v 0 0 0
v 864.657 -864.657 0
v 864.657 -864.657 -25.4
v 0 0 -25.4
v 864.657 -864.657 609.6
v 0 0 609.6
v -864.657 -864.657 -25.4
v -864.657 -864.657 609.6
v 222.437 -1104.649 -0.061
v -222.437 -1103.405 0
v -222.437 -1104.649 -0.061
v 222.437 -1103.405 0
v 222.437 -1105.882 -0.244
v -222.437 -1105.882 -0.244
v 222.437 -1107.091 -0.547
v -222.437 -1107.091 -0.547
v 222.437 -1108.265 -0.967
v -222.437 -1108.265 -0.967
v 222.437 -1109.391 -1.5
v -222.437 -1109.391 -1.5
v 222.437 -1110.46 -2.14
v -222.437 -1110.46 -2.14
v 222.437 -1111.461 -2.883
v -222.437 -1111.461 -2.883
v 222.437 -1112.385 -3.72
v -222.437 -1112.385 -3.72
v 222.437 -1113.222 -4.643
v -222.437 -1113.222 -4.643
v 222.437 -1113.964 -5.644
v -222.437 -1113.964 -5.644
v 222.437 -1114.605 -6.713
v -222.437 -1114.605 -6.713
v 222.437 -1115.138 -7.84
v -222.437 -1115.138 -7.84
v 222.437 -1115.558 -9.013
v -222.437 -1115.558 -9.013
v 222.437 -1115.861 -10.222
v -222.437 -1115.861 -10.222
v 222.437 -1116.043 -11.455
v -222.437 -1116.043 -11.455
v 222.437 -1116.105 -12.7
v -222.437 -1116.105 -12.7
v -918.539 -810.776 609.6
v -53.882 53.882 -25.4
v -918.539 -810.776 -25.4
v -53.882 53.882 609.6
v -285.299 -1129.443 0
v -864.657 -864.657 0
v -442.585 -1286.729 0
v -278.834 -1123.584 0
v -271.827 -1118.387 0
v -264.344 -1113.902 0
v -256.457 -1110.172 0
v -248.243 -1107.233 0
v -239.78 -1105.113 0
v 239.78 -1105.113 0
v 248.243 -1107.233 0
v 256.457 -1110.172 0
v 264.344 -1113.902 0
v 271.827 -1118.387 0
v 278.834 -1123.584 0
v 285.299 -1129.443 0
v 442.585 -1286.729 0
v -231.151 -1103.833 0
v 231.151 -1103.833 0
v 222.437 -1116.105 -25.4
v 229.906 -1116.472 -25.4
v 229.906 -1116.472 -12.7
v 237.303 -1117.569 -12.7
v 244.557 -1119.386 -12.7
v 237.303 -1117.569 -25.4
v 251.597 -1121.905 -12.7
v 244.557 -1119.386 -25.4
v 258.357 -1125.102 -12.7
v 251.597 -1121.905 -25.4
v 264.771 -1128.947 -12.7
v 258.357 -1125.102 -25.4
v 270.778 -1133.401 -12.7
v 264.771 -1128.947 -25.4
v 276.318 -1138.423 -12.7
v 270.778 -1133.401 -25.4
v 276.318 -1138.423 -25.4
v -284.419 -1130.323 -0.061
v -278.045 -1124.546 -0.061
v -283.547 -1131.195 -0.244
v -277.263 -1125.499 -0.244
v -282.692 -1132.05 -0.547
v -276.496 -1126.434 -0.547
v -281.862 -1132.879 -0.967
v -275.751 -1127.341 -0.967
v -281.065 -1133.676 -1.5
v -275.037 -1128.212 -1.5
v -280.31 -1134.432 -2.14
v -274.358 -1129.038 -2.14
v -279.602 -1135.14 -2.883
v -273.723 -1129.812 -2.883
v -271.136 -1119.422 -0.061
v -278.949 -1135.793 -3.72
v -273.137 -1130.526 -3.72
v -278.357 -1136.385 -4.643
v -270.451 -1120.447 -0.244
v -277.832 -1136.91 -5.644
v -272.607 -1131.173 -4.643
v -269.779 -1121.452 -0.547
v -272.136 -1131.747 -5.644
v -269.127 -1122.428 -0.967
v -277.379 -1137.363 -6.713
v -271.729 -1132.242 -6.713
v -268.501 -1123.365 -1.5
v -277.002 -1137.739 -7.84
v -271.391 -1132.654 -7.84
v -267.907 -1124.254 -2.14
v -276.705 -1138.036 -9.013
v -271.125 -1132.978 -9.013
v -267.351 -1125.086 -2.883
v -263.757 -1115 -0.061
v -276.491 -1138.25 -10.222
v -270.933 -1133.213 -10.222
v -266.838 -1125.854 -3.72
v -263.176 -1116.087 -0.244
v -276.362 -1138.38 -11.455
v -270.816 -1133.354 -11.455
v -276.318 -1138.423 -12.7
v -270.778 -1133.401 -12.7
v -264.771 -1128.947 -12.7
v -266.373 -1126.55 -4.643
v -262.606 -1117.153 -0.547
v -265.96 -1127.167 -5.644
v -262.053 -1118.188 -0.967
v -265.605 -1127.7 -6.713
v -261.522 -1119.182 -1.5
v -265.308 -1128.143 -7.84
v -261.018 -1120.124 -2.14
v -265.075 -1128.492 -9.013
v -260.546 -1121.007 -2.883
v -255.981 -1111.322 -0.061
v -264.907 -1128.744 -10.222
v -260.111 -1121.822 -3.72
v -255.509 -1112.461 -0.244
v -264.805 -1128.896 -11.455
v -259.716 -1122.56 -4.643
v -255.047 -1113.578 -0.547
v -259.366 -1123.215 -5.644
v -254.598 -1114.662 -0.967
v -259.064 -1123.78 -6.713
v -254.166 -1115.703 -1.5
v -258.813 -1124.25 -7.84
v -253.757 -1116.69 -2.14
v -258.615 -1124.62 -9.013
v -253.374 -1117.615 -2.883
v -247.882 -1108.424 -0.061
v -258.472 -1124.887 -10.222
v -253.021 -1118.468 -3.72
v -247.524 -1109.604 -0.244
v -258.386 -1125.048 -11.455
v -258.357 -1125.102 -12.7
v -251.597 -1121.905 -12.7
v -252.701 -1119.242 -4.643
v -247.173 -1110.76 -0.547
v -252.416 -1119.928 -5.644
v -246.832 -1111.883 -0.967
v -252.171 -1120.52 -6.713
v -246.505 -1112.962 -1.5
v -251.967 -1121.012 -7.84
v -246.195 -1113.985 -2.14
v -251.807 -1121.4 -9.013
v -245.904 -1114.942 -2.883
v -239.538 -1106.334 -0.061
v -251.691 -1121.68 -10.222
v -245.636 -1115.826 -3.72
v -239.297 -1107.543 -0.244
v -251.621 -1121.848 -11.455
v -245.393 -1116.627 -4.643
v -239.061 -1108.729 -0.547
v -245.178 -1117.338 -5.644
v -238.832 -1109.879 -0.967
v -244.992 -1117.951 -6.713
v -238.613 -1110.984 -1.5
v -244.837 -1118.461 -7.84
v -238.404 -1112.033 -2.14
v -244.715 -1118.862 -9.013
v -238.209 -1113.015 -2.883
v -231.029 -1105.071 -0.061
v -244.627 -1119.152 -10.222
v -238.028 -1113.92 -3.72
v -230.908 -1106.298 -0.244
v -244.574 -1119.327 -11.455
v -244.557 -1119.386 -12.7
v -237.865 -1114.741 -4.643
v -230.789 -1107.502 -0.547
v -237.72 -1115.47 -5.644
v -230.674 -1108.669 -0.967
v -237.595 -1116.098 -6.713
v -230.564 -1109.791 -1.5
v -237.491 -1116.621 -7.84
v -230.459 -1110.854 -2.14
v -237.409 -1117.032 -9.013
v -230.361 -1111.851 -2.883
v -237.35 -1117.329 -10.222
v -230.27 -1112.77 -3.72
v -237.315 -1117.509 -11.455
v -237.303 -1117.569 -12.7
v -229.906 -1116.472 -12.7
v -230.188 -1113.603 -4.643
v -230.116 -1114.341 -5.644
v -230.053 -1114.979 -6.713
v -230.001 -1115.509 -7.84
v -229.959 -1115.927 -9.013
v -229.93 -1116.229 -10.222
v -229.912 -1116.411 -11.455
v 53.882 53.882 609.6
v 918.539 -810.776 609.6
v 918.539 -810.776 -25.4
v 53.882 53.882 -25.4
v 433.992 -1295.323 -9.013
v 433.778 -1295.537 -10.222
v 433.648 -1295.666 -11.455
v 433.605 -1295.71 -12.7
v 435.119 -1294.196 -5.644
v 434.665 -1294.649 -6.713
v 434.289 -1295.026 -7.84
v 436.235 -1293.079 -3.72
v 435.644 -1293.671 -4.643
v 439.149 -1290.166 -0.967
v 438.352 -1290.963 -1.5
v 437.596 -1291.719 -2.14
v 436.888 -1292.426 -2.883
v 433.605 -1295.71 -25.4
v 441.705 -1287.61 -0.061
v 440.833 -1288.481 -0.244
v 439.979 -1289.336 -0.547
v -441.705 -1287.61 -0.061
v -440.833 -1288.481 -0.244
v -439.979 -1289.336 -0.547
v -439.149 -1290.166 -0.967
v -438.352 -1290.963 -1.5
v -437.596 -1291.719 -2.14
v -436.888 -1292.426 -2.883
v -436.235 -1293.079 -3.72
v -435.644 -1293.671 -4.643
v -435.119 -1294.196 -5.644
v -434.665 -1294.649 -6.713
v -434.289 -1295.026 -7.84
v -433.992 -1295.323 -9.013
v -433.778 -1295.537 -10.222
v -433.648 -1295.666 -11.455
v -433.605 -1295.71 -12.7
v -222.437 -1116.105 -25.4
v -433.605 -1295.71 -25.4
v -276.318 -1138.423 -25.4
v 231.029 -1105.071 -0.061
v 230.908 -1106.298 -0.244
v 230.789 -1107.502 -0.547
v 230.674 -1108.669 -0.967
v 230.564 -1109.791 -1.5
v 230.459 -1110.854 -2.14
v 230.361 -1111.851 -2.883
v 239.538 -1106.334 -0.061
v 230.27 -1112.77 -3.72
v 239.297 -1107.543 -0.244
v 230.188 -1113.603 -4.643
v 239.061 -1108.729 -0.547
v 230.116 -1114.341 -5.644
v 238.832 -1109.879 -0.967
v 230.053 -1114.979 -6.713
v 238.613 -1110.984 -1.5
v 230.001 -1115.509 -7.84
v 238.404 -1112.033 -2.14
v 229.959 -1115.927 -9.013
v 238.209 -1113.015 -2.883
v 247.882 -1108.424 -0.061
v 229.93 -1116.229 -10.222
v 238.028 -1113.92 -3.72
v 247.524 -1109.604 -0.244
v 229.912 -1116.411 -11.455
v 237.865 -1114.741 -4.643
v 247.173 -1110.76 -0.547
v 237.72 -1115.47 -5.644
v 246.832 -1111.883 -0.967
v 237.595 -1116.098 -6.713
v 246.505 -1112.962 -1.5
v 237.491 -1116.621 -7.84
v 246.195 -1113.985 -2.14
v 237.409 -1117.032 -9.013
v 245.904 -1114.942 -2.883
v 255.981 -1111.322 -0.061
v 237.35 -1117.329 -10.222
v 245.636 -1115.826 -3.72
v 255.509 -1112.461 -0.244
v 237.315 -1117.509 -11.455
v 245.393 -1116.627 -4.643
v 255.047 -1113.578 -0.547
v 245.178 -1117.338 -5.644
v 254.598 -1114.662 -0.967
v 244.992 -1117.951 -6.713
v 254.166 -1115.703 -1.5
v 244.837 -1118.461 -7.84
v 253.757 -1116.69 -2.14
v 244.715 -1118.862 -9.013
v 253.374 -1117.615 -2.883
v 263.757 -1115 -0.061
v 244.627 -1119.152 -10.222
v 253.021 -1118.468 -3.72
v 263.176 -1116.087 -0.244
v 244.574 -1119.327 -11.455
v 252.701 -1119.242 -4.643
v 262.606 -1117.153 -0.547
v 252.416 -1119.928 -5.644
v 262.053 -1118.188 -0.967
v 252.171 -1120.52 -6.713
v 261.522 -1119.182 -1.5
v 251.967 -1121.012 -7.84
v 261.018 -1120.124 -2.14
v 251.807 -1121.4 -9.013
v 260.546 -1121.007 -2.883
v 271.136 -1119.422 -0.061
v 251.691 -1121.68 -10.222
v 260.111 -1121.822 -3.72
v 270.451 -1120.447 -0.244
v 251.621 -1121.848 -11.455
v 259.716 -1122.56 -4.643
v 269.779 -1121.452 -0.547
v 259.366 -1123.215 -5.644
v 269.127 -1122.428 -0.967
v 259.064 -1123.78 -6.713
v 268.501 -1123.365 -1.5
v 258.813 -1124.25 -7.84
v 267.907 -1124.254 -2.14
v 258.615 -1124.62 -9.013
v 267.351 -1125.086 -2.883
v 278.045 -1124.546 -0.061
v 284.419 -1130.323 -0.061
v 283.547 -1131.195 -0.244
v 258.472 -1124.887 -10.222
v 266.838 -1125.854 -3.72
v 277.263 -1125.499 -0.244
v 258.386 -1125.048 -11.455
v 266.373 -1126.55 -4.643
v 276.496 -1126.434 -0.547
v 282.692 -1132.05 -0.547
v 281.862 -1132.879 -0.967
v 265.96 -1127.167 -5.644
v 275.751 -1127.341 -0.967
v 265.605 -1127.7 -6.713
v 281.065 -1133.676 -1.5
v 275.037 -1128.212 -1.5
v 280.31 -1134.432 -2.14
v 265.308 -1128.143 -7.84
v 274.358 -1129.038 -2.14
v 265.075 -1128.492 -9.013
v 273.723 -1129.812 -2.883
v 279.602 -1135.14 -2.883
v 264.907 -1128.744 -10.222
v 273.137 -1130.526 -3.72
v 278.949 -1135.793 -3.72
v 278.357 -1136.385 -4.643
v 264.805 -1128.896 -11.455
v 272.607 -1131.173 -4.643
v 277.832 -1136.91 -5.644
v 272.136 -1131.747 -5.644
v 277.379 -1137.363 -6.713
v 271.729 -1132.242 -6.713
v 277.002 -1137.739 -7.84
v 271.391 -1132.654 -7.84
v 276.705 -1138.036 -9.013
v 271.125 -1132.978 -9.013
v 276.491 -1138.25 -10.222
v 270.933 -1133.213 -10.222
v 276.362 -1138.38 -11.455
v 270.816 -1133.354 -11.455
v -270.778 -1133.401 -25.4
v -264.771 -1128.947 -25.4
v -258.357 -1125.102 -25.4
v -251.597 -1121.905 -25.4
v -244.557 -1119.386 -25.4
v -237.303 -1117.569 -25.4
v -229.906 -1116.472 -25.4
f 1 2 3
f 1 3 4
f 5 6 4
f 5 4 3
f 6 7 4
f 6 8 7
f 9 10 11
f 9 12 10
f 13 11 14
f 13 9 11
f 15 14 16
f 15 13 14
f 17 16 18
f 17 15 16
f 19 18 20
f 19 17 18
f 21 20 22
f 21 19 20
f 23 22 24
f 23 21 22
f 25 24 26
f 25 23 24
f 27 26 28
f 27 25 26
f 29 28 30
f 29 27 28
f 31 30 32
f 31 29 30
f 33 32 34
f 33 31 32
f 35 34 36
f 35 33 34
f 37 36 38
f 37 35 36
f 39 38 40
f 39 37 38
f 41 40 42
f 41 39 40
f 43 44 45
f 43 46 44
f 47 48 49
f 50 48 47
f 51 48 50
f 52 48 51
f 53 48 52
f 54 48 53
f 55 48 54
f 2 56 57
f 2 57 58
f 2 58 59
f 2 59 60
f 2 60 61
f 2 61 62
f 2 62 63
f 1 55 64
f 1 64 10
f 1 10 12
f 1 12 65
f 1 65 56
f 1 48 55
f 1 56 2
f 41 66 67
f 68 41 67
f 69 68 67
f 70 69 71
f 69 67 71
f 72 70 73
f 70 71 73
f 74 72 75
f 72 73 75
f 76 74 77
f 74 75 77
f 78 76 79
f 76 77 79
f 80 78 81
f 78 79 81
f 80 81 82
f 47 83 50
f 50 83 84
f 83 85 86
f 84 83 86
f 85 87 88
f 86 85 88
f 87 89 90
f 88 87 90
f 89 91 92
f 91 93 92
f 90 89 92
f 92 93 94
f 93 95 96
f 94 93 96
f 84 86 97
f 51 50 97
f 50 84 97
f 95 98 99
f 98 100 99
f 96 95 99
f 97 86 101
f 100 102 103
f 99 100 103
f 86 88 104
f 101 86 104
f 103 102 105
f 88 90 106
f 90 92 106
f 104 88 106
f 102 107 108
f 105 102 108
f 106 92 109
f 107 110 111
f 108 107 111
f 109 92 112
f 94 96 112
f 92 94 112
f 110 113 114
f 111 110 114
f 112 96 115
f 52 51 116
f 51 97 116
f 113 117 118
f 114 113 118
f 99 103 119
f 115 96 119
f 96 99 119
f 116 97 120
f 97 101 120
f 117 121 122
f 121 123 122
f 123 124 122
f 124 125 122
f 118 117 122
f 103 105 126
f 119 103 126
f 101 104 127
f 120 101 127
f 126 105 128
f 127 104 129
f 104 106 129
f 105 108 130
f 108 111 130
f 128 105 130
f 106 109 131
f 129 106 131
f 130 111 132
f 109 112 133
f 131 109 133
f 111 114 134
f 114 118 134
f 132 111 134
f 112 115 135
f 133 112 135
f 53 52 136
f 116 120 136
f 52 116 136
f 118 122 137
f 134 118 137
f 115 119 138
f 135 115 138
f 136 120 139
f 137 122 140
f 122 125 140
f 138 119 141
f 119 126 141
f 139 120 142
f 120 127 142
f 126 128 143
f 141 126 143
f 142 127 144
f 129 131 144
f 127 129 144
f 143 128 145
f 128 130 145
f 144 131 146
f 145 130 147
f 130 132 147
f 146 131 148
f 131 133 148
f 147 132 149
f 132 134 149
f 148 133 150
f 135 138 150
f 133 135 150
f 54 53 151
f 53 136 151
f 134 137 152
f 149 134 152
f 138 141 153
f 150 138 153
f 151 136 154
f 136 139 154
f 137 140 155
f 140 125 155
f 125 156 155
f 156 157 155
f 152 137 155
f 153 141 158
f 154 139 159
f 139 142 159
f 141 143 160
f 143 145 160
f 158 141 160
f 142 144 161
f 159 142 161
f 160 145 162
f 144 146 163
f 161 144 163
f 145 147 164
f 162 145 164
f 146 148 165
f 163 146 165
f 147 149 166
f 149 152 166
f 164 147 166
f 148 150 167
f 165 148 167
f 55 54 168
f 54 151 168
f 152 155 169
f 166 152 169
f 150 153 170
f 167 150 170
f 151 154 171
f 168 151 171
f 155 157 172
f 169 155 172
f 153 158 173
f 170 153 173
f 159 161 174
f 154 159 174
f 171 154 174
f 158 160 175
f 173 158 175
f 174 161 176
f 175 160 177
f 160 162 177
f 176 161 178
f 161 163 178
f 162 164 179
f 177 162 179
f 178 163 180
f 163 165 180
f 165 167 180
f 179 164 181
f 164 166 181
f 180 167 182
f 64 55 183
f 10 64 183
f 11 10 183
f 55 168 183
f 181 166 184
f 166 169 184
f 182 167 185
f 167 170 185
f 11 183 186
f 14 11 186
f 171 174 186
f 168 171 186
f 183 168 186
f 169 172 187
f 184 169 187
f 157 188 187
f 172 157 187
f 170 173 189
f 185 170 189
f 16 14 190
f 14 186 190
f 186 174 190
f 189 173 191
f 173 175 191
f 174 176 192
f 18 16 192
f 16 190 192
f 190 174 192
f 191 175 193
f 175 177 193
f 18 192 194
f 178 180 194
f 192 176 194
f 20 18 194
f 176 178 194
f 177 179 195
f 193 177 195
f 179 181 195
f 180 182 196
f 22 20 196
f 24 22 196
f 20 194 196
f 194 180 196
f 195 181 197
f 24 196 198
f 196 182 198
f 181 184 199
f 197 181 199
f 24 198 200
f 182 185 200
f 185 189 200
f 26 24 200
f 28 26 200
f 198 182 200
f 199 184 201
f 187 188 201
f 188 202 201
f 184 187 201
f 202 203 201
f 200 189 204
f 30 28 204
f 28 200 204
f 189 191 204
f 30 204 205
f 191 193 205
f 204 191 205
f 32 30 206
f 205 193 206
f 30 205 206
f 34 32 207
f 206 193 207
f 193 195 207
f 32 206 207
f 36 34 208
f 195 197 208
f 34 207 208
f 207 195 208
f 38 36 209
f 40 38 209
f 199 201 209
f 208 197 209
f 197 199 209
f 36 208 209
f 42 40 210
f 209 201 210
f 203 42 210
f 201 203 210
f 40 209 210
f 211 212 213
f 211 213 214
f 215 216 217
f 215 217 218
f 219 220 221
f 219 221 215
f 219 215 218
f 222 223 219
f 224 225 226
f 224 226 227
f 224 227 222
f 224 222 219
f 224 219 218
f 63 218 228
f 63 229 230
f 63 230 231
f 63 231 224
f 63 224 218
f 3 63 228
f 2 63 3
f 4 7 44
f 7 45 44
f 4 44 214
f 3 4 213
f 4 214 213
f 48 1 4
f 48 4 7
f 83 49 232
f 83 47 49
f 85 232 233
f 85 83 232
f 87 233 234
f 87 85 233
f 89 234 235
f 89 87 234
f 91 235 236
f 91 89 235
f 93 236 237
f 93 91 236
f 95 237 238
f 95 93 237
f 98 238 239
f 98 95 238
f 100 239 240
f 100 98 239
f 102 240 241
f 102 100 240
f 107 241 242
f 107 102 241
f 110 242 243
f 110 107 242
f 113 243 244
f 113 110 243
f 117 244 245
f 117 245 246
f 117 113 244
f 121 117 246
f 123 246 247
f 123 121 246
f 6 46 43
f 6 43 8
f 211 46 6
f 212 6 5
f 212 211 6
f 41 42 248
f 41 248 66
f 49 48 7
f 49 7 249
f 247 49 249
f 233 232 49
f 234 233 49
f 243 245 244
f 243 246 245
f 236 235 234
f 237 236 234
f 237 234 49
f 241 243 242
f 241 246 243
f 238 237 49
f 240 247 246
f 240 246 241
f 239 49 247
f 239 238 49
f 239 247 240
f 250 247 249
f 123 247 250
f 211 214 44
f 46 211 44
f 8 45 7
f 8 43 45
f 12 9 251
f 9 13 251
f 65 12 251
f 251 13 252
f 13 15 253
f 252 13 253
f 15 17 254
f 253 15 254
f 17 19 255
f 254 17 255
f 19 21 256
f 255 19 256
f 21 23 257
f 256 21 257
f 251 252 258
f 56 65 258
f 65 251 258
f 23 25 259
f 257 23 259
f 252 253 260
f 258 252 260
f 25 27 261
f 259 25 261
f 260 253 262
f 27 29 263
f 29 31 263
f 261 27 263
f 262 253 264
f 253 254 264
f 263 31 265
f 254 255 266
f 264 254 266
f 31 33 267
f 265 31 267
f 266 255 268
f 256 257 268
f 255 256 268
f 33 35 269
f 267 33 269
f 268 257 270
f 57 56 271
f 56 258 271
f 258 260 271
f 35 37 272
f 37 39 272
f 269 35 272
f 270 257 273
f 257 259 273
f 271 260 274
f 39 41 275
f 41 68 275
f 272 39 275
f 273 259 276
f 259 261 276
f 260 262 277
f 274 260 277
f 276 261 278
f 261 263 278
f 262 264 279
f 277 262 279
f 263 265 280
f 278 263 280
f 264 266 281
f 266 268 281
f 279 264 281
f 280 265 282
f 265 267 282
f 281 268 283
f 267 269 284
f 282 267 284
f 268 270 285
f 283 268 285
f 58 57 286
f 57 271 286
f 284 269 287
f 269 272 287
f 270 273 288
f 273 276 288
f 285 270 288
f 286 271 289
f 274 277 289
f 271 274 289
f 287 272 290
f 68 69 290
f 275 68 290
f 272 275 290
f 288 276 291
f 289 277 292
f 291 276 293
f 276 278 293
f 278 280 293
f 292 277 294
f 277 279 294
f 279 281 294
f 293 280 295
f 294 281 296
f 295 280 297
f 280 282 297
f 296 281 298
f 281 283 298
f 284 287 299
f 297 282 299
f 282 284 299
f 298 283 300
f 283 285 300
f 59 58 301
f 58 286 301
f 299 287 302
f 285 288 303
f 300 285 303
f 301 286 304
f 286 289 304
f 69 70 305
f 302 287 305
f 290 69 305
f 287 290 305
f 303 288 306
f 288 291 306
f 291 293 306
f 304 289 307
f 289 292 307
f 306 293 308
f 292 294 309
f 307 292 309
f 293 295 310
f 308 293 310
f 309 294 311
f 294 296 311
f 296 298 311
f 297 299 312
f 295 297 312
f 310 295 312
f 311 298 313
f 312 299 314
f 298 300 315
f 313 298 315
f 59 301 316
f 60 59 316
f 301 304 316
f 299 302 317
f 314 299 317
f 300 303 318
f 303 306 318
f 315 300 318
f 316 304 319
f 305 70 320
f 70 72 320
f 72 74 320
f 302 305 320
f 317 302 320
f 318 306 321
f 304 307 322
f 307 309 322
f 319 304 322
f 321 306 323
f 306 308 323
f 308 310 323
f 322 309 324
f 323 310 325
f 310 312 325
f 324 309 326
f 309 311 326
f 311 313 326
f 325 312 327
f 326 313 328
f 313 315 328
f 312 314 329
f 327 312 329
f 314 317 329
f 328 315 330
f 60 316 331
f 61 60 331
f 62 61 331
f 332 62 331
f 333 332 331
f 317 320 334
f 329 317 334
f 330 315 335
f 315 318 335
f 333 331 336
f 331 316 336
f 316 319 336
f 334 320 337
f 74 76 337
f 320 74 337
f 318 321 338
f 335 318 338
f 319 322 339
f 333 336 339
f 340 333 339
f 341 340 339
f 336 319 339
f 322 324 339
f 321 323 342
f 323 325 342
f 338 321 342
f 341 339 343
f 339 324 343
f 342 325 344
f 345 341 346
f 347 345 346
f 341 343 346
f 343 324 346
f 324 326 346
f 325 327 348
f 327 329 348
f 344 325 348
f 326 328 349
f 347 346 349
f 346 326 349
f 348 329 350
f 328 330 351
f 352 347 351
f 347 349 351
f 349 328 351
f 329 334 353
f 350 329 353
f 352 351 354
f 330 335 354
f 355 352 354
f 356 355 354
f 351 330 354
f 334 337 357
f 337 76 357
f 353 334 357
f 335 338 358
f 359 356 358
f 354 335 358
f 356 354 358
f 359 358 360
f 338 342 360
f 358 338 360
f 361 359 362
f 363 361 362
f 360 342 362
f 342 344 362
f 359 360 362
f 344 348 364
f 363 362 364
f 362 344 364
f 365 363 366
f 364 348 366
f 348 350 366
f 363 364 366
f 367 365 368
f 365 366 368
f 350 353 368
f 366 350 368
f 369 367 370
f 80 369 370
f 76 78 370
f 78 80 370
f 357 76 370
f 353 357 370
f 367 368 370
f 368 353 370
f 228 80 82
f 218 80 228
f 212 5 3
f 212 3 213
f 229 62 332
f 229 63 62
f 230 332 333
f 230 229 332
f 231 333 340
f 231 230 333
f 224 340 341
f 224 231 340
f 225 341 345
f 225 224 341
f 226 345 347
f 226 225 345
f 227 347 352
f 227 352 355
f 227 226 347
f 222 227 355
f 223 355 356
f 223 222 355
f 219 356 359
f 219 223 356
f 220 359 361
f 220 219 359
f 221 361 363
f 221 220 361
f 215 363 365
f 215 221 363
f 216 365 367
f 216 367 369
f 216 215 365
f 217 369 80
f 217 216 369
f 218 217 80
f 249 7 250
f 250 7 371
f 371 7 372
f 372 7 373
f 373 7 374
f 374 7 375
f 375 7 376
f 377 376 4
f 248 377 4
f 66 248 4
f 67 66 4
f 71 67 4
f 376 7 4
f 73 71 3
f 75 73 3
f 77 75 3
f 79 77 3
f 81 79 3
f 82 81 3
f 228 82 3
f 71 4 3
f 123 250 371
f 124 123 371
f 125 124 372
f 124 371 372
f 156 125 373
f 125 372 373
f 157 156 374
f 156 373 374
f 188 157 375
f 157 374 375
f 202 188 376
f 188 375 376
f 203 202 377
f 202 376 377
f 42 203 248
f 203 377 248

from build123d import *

# Parameters (mm, degrees)
F1_DEPTH      = 25.4
F2_DEPTH      = 609.6
F2_DEPTH_BACK = 25.4
F3_DEPTH      = 609.6
F3_DEPTH_BACK = 25.4
F4_DEPTH      = 609.6
F4_DEPTH_BACK = 25.4
F5_R          = 76.2
F6_R          = 12.7


with BuildPart() as f1:
    # F0 (on Top) → F1 (new body)
    with BuildSketch(Plane.XY):
        Polygon((433.6051224214, -1295.709710044), (864.6574162327, -864.6574162327), (0, 0), (-864.6574162327, -864.6574162327), (-433.6051224214, -1295.709710044), (-254, -1116.1045876226), (254, -1116.1045876226), align=None)
    extrude(amount=-F1_DEPTH)

    # F5
    f5_edges = [f1.edges().sort_by_distance(p)[0] for p in [
        (-254, -1116.104588, -12.7),
        (254, -1116.104588, -12.7),
    ]]
    fillet(f5_edges, radius=F5_R)

    # F6
    f6_edges = [f1.edges().sort_by_distance(p)[0] for p in [
        (354.961793, -1217.06638, 0),
    ]]
    fillet(f6_edges, radius=F6_R)


with BuildPart() as f2:
    # F0 (on Top) → F2 (new body, two sides)
    with BuildSketch(Plane.XY) as f2_sk:
        Polygon((-53.8815367264, 53.8815367264), (0, 0), (53.8815367264, 53.8815367264), align=None)
    extrude(amount=F2_DEPTH)
    extrude(f2_sk.sketch, amount=-F2_DEPTH_BACK)

    # F0 (on Top) → F3 (join, two sides)
    with BuildSketch(Plane.XY) as f3_sk:
        Polygon((0, 0), (864.6574162327, -864.6574162327), (918.5389529591, -810.7758795063), (53.8815367264, 53.8815367264), align=None)
    extrude(amount=F3_DEPTH)
    extrude(f3_sk.sketch, amount=-F3_DEPTH_BACK)

    # F0 (on Top) → F4 (join, two sides)
    with BuildSketch(Plane.XY) as f4_sk:
        Polygon((-864.6574162327, -864.6574162327), (0, 0), (-53.8815367264, 53.8815367264), (-918.5389529591, -810.7758795063), align=None)
    extrude(amount=F4_DEPTH)
    extrude(f4_sk.sketch, amount=-F4_DEPTH_BACK)


solid = Compound([f1.part, f2.part])
